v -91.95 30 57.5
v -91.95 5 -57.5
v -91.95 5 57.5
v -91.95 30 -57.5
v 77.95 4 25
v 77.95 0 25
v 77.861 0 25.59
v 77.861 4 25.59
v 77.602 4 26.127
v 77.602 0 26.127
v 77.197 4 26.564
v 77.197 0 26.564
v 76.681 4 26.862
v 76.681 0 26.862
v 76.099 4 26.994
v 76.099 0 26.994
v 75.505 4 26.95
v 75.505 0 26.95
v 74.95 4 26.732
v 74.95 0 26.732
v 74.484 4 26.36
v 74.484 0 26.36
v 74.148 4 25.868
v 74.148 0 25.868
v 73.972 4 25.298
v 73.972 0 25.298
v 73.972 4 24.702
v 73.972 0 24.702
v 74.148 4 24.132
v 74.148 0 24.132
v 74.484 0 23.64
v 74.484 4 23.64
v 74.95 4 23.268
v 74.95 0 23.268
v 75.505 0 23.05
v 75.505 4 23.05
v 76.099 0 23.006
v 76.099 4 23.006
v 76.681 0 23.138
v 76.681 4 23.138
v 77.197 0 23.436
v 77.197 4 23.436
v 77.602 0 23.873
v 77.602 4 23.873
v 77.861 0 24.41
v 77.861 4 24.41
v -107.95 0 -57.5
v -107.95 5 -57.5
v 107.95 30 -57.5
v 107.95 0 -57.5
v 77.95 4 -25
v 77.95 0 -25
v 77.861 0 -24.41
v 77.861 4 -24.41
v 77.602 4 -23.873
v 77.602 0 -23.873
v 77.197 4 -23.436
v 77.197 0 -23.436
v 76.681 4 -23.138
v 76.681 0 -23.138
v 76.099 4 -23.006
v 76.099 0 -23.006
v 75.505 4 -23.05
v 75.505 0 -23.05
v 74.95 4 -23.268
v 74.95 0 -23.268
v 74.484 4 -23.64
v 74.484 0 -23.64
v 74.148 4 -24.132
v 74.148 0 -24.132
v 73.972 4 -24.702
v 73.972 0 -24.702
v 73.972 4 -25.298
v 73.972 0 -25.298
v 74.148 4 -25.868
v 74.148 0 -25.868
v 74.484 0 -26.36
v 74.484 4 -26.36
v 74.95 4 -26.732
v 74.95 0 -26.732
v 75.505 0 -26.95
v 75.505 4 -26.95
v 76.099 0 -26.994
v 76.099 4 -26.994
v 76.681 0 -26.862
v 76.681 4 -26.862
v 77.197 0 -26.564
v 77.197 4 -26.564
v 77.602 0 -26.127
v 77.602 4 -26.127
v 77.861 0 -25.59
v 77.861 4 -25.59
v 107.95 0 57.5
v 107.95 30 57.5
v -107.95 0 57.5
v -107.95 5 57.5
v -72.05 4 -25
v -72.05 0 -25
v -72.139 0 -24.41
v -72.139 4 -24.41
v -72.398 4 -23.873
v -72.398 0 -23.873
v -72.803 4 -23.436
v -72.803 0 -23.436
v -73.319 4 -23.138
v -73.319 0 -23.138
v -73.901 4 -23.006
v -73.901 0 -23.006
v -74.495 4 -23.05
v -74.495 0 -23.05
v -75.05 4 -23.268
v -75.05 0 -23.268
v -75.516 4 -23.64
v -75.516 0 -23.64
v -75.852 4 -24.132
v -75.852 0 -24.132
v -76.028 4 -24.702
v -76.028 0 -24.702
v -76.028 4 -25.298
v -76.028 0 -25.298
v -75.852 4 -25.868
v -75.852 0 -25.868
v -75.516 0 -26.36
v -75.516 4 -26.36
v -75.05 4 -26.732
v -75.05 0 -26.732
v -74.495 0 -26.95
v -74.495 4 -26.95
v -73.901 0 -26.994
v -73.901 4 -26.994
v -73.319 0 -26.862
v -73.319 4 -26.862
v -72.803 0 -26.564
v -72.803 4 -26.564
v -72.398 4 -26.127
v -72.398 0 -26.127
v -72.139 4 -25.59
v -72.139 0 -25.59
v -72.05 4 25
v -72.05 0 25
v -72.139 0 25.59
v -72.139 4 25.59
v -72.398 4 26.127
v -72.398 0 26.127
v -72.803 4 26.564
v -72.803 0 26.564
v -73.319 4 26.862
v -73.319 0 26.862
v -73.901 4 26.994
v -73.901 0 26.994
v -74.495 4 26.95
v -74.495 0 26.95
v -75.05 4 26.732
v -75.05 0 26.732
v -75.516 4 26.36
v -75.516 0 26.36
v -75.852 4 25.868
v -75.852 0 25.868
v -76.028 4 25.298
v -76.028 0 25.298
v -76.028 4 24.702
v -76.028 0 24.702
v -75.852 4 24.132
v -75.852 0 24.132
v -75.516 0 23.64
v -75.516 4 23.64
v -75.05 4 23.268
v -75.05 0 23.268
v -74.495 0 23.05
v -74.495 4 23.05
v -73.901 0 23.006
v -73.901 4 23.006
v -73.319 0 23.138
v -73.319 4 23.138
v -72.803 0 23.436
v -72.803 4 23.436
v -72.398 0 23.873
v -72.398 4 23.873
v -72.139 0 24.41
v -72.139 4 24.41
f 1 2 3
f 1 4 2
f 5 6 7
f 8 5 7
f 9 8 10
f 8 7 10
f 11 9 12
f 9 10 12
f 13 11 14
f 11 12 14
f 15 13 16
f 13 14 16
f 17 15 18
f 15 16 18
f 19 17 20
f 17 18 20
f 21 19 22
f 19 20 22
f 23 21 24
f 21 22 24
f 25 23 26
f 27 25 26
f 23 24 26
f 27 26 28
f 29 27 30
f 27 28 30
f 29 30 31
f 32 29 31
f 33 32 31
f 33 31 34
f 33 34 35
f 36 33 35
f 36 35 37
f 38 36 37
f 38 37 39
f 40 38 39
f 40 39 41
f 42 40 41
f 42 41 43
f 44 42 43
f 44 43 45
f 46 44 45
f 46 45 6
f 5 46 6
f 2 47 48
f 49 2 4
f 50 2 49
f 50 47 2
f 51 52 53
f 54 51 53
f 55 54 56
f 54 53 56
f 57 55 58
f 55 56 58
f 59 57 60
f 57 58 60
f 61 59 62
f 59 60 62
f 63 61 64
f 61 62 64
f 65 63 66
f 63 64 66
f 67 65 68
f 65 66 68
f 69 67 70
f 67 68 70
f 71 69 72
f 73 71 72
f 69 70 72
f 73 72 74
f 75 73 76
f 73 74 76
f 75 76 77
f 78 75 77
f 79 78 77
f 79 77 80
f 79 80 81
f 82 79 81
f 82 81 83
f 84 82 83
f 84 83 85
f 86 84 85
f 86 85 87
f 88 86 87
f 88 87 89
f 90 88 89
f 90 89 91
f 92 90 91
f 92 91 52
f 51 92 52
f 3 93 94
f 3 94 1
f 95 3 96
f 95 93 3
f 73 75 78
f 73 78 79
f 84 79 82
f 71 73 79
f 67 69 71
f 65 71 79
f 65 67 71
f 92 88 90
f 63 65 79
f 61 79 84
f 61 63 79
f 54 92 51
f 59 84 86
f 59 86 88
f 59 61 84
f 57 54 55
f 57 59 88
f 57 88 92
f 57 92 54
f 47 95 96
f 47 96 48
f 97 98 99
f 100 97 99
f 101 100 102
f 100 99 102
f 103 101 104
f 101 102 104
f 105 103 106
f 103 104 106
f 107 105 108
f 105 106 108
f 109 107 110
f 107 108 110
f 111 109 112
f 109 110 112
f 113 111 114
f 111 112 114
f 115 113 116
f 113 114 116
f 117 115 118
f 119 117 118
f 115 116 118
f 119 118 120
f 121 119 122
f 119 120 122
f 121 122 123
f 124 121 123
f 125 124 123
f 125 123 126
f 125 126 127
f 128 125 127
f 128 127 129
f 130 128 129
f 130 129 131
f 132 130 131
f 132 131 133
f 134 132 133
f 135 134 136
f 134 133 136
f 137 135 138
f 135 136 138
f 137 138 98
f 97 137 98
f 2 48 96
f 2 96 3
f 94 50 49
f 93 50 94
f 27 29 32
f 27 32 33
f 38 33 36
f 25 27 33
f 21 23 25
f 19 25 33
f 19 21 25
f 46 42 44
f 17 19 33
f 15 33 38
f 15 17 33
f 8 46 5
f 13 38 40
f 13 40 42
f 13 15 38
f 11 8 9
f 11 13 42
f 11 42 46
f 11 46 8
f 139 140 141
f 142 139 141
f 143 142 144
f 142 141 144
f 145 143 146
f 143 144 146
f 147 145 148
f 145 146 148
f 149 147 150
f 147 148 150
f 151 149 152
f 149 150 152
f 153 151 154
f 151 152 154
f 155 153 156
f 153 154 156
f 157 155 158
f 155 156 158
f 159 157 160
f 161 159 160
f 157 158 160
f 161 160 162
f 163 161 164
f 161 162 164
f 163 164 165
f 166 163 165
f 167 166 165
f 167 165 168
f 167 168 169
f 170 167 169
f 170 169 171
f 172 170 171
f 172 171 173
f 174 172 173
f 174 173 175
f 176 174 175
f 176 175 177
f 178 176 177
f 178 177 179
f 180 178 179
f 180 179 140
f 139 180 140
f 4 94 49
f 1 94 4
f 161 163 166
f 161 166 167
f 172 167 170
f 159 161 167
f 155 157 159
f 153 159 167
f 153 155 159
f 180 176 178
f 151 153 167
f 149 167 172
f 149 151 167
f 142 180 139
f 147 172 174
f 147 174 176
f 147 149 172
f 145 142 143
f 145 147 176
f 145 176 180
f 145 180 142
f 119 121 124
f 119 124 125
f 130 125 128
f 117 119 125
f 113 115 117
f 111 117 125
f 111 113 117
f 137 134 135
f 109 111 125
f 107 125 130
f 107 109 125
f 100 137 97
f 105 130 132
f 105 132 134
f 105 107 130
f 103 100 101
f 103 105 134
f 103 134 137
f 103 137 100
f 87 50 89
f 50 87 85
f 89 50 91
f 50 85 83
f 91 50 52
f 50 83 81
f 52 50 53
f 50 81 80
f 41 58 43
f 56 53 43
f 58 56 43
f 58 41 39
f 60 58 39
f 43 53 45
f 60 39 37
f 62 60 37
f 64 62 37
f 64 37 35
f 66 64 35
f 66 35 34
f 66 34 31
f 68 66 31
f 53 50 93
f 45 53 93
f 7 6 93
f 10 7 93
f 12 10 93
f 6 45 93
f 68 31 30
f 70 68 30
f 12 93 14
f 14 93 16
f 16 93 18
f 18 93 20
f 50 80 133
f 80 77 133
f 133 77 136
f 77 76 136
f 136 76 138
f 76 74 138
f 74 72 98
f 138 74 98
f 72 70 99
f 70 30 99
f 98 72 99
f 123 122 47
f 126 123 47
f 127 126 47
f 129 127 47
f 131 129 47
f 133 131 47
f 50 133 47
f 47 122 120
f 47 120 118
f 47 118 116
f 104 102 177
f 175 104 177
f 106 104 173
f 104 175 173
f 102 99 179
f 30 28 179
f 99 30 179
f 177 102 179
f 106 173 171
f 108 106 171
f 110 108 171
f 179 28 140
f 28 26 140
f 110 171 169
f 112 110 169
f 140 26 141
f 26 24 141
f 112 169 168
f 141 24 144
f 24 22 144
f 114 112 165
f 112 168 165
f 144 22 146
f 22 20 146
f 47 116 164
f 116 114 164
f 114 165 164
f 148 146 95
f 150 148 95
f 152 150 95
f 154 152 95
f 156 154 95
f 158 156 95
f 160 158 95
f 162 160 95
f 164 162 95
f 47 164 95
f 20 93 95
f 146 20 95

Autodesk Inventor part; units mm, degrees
ref_plane "YZ Plane" through (0, 0, 0) normal (1, 0, 0) x (0, 1, 0)
ref_plane "XZ Plane" through (0, 0, 0) normal (0, 1, 0) x (-1, 0, 0)
ref_plane "XY Plane" through (0, 0, 0) normal (0, 0, 1) x (1, 0, 0)
sketch "Sketch1" plane through (0, 0, 0) normal (0, 1, 0) x (-1, 0, 0)
  line L0 (-107.95, 57.5) -> (107.95, 57.5)
  line L1 (107.95, 57.5) -> (107.95, -57.5)
  line L2 (107.95, -57.5) -> (-107.95, -57.5)
  line L3 (-107.95, -57.5) -> (-107.95, 57.5)
  line L4 (-107.95, 57.5) -> (107.95, -57.5) construction
  line L5 (107.95, 57.5) -> (-107.95, -57.5) construction
  point P0 (0, 0)
  dimension "d0" = 215.9
  dimension "d1" = 115
extrude "Extrusion1" add sketch "Sketch1" along normal blind 30
sketch "Sketch2" plane through (0, 30, 0) normal (0, 1, 0) x (1, 0, 0)
  line L0 (107.95, 57.5) -> (-107.95, 57.5) projected
  line L1 (-107.95, 57.5) -> (-107.95, -57.5) projected
  line L2 (-107.95, -57.5) -> (107.95, -57.5) projected
  line L3 (107.95, -57.5) -> (107.95, 57.5) projected
  line L4 (-91.95, 57.5) -> (-91.95, -57.5)
  point P0 (0, 0)
  dimension "d4" = 16
extrude "Extrusion2" cut sketch "Sketch2" against normal blind 25 contours L4 L2 L1 L0
sketch "Sketch3" plane through (0, 0, 0) normal (0, -1, 0) x (1, 0, 0)
  line L0 (-74.05, 25) -> (75.95, 25) construction
  line L1 (75.95, 25) -> (75.95, -25) construction
  line L2 (107.95, 57.5) -> (107.95, -57.5) construction
  line L3 (0, 0) -> (75.95, 0) construction
  circle A0 centre (-74.05, 25) radius 2
  circle A1 centre (75.95, 25) radius 2
  circle A2 centre (75.95, -25) radius 2
  line L4 (-74.05, 25) -> (-74.05, -25) construction
  circle A3 centre (-74.05, -25) radius 2
  line L5 (107.95, -57.5) -> (-107.95, -57.5) construction
  line L6 (107.95, 57.5) -> (107.95, -57.5) projected
  line L7 (-107.95, 57.5) -> (107.95, 57.5) construction
  line L8 (-107.95, -57.5) -> (-107.95, 57.5) construction
  dimension "d7" = 150
  dimension "d8" = 50
  dimension "d9" = 32
  dimension "d10" = 4
extrude "Extrusion3" cut sketch "Sketch3" against normal blind 4
properties part number "Stepper Power Supply"
